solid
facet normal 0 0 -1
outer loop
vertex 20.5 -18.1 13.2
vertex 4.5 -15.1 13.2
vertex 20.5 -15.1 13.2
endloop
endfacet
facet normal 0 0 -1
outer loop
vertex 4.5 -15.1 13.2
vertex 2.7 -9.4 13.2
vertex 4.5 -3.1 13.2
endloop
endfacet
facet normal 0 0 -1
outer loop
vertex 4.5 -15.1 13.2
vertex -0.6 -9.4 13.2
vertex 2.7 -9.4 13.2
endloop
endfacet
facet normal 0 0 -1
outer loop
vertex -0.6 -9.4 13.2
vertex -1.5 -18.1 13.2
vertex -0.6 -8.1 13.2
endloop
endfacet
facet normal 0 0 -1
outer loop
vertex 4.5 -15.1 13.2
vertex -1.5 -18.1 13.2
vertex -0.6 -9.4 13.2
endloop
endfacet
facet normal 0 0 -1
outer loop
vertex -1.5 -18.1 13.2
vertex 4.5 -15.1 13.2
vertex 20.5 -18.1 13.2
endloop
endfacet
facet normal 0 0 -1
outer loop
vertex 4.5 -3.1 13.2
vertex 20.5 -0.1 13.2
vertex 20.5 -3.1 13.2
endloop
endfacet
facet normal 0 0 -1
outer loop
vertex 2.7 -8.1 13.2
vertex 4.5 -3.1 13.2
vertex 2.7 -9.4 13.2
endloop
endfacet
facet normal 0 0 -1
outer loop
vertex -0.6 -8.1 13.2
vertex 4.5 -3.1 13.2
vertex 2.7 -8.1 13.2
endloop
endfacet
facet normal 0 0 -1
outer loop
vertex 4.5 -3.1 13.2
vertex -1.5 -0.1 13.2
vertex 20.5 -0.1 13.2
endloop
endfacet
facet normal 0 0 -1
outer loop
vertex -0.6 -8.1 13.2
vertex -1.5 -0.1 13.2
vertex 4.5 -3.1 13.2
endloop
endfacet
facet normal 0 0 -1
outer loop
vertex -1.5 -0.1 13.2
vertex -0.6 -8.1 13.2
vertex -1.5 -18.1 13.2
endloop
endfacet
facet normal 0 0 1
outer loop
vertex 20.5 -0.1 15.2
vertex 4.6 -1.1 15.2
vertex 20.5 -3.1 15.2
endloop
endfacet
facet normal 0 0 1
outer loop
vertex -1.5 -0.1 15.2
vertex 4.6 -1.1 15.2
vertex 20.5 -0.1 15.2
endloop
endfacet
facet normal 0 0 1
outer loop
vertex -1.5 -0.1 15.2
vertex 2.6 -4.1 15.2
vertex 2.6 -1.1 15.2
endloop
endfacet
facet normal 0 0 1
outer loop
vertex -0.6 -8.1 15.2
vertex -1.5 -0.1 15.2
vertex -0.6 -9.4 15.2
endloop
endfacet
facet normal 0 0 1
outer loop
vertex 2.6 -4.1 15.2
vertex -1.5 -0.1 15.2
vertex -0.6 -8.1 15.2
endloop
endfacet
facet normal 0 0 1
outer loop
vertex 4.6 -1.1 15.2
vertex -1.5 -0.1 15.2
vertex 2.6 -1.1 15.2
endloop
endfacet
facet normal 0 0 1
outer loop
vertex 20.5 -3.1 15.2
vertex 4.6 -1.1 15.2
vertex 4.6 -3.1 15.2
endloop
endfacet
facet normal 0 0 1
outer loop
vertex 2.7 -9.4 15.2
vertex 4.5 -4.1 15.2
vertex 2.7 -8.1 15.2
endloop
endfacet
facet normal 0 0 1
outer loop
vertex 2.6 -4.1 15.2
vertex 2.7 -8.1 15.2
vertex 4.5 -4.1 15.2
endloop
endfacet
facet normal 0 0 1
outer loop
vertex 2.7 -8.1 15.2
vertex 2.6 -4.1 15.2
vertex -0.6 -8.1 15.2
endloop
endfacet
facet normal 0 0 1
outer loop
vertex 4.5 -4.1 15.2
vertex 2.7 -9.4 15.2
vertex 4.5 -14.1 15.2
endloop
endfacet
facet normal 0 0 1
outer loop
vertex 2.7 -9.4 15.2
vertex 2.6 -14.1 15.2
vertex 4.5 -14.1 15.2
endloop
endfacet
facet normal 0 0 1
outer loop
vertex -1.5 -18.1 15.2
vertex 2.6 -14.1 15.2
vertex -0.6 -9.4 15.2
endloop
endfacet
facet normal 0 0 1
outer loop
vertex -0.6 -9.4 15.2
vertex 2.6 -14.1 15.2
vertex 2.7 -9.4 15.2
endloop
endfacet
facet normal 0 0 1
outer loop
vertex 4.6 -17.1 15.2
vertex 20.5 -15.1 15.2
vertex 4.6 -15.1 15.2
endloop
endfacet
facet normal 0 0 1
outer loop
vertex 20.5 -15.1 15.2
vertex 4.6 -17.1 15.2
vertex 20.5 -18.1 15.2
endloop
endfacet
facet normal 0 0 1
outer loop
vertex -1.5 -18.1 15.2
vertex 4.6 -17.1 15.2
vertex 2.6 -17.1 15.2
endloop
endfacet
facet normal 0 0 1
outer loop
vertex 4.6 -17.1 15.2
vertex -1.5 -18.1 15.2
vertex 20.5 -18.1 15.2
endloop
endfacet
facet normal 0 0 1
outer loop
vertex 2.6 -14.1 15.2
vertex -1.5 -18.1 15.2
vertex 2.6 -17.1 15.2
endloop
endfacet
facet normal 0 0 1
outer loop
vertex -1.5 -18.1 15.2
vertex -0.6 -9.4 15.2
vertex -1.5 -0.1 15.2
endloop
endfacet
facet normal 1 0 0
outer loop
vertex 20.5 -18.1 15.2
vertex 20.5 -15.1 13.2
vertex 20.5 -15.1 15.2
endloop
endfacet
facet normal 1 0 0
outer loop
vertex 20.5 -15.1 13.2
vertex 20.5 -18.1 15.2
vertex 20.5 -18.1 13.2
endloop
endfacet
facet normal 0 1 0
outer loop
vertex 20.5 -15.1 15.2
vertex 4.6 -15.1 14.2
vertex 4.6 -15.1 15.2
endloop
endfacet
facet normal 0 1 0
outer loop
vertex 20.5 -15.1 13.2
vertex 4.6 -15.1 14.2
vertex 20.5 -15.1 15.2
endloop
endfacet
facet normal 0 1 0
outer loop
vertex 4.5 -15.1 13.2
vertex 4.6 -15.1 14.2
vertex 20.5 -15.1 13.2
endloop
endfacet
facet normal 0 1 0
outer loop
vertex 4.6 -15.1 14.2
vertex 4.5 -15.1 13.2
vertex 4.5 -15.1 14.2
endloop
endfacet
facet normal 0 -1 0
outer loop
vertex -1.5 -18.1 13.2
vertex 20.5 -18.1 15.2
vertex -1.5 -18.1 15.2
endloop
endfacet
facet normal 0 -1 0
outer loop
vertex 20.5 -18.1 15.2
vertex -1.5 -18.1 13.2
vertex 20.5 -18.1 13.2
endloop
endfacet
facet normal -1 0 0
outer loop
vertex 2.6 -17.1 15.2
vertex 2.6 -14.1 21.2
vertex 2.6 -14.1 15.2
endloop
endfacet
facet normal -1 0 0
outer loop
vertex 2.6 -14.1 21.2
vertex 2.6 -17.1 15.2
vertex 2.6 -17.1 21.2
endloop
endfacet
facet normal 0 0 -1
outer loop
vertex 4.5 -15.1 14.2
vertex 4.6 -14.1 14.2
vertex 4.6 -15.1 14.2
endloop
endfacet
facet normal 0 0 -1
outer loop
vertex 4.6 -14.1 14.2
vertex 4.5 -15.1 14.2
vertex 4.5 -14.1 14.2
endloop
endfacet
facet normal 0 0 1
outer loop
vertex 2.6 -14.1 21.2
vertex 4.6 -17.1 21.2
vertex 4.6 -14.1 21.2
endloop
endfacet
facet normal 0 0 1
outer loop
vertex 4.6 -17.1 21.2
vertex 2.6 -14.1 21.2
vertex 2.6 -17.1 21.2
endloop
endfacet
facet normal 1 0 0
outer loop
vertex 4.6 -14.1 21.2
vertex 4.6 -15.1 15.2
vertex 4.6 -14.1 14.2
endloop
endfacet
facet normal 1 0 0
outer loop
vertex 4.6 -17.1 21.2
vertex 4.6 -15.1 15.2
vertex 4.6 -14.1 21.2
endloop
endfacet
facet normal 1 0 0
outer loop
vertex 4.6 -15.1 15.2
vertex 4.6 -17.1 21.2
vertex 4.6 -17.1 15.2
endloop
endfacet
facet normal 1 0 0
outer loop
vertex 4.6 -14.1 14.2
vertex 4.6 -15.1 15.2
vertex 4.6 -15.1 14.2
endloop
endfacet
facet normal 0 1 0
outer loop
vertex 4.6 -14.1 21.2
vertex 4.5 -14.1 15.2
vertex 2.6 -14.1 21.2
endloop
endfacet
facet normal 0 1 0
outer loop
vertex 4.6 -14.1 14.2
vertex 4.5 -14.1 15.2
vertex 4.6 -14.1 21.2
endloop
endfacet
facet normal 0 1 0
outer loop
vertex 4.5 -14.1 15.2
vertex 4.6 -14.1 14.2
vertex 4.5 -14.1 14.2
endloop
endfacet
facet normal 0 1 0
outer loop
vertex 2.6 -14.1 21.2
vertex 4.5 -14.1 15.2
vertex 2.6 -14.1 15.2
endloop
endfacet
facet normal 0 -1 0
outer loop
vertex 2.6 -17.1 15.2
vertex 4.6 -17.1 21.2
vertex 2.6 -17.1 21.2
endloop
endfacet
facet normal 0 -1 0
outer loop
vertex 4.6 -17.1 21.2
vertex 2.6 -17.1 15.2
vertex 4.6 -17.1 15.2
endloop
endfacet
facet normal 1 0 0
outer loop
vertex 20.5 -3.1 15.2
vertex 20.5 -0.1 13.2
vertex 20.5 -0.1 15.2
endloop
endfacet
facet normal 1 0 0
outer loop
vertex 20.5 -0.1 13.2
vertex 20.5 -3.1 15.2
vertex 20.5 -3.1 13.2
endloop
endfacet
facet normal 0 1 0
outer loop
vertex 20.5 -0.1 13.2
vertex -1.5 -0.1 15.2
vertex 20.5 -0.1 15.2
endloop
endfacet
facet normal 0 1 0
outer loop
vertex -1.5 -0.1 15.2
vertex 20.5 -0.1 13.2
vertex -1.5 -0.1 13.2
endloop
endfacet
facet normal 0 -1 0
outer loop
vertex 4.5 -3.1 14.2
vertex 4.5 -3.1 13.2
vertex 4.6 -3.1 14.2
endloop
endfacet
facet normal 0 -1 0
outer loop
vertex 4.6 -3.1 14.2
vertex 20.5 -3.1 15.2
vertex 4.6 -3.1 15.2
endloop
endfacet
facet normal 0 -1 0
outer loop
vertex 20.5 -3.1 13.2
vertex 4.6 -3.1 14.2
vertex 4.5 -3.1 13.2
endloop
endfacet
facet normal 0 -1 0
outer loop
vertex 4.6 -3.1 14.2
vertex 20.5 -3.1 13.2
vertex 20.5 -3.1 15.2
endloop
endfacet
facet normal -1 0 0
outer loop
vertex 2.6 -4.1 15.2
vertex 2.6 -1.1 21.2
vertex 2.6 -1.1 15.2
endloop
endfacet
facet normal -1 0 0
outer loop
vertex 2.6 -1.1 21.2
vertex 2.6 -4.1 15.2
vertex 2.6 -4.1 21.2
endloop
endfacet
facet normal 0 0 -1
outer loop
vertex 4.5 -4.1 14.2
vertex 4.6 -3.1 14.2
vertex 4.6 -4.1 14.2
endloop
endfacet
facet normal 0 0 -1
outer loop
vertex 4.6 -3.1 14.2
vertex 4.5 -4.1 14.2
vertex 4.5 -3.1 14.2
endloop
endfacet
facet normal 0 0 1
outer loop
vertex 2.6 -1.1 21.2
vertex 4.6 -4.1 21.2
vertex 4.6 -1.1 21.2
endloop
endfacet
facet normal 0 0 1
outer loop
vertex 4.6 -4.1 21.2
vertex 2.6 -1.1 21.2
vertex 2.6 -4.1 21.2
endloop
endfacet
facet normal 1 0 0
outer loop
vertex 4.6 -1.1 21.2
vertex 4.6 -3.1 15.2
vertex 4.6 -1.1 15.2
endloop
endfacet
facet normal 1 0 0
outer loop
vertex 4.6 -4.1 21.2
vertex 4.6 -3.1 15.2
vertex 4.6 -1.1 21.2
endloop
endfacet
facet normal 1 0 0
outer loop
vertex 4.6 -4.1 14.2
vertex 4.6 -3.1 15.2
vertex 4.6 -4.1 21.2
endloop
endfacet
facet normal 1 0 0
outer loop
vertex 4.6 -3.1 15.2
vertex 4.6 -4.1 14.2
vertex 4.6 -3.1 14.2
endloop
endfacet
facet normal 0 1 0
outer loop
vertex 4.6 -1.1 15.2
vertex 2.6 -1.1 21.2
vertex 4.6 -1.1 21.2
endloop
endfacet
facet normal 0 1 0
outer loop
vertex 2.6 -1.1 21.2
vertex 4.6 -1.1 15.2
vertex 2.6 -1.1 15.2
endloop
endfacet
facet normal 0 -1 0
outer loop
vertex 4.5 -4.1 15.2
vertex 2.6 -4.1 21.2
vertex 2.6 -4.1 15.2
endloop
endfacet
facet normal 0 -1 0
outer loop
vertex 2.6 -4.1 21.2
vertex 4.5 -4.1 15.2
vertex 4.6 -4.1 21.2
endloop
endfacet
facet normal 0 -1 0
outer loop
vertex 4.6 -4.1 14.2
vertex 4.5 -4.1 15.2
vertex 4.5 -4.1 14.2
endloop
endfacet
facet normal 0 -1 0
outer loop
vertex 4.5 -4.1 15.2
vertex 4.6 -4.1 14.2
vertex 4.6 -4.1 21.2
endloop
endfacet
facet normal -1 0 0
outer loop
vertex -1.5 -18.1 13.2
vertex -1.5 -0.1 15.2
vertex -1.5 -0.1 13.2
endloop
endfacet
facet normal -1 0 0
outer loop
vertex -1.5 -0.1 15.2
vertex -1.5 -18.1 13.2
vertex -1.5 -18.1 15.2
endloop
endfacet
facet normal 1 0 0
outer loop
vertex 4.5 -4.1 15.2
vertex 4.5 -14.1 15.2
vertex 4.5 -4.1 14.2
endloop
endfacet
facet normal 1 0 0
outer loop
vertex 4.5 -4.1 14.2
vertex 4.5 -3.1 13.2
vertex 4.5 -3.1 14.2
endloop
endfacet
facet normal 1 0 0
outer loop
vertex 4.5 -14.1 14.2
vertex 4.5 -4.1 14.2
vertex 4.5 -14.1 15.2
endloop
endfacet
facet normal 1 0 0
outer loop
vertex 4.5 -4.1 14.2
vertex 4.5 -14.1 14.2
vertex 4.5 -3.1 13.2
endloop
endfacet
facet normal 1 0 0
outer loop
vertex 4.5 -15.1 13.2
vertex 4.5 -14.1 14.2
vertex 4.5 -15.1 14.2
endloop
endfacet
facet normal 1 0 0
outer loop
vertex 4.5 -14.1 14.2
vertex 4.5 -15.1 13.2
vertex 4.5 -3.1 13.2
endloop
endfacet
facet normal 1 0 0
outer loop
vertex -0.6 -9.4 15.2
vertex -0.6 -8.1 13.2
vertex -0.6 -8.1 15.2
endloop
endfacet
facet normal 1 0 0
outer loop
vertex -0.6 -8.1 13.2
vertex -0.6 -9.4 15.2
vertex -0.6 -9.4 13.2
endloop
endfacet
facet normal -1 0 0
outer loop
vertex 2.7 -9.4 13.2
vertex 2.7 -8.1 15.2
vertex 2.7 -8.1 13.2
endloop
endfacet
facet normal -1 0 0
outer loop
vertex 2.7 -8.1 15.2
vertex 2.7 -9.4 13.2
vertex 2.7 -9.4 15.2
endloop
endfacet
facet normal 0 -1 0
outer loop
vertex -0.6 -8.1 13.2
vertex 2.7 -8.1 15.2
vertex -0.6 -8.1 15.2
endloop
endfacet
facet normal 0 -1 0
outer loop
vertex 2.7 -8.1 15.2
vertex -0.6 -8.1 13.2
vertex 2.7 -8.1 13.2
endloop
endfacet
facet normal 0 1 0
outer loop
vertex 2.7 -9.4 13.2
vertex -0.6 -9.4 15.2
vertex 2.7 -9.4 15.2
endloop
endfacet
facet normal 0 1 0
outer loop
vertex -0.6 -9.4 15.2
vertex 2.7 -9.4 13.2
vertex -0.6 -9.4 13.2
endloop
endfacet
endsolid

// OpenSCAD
$fn = 20;

l = 22.5;
w = 30;
h = 15;

module BFS (){
	cube([l,w,h]);
}

module PinHole (){
	difference(){
		translate([(l/2)-(1/2),0,h])cube([1,3,5]);
		translate([l/2.2,1.5,h+3.6])rotate([0,90,0])cylinder(d=1.4,h=2);
	}
}

module AGU (){
	translate([l/4,w/4,h])cube([l/2,w/2,h/3]);
}

module Chute (){
	translate([l/4,w/4,h+h/3])cube([l/2,w/2,h/3]);
}

//BFS(); PinHole();
//AGU();

//Chute();

module fullArm(){

	l = 20;
	w = 3;
	h = 3;

	module leftarm (){
		cube([l,w,h-1]);
		translate([l-4.1,-1,-6])cube([2,3,7]);
	}
	module rightarm (){
		cube([l,w,h-1]);
		translate([l-4.1,1,-6])cube([2,3,7]);
	}
	rightarm();
	translate([0,15,0])leftarm();
	difference(){
		translate([(l-4),0,0])cube([6,18,2]);
		translate([(l-2.2),(15/2)+1.2,-0.1])cube([3.3,1.3,4.2]);
	}
}

translate([20.5,-18.1,h+0.2])rotate([0,180,0])fullArm();

module Pin(){
	cylinder(d=1.2,h=5);
}

//translate([-1,-1,0])Pin();
